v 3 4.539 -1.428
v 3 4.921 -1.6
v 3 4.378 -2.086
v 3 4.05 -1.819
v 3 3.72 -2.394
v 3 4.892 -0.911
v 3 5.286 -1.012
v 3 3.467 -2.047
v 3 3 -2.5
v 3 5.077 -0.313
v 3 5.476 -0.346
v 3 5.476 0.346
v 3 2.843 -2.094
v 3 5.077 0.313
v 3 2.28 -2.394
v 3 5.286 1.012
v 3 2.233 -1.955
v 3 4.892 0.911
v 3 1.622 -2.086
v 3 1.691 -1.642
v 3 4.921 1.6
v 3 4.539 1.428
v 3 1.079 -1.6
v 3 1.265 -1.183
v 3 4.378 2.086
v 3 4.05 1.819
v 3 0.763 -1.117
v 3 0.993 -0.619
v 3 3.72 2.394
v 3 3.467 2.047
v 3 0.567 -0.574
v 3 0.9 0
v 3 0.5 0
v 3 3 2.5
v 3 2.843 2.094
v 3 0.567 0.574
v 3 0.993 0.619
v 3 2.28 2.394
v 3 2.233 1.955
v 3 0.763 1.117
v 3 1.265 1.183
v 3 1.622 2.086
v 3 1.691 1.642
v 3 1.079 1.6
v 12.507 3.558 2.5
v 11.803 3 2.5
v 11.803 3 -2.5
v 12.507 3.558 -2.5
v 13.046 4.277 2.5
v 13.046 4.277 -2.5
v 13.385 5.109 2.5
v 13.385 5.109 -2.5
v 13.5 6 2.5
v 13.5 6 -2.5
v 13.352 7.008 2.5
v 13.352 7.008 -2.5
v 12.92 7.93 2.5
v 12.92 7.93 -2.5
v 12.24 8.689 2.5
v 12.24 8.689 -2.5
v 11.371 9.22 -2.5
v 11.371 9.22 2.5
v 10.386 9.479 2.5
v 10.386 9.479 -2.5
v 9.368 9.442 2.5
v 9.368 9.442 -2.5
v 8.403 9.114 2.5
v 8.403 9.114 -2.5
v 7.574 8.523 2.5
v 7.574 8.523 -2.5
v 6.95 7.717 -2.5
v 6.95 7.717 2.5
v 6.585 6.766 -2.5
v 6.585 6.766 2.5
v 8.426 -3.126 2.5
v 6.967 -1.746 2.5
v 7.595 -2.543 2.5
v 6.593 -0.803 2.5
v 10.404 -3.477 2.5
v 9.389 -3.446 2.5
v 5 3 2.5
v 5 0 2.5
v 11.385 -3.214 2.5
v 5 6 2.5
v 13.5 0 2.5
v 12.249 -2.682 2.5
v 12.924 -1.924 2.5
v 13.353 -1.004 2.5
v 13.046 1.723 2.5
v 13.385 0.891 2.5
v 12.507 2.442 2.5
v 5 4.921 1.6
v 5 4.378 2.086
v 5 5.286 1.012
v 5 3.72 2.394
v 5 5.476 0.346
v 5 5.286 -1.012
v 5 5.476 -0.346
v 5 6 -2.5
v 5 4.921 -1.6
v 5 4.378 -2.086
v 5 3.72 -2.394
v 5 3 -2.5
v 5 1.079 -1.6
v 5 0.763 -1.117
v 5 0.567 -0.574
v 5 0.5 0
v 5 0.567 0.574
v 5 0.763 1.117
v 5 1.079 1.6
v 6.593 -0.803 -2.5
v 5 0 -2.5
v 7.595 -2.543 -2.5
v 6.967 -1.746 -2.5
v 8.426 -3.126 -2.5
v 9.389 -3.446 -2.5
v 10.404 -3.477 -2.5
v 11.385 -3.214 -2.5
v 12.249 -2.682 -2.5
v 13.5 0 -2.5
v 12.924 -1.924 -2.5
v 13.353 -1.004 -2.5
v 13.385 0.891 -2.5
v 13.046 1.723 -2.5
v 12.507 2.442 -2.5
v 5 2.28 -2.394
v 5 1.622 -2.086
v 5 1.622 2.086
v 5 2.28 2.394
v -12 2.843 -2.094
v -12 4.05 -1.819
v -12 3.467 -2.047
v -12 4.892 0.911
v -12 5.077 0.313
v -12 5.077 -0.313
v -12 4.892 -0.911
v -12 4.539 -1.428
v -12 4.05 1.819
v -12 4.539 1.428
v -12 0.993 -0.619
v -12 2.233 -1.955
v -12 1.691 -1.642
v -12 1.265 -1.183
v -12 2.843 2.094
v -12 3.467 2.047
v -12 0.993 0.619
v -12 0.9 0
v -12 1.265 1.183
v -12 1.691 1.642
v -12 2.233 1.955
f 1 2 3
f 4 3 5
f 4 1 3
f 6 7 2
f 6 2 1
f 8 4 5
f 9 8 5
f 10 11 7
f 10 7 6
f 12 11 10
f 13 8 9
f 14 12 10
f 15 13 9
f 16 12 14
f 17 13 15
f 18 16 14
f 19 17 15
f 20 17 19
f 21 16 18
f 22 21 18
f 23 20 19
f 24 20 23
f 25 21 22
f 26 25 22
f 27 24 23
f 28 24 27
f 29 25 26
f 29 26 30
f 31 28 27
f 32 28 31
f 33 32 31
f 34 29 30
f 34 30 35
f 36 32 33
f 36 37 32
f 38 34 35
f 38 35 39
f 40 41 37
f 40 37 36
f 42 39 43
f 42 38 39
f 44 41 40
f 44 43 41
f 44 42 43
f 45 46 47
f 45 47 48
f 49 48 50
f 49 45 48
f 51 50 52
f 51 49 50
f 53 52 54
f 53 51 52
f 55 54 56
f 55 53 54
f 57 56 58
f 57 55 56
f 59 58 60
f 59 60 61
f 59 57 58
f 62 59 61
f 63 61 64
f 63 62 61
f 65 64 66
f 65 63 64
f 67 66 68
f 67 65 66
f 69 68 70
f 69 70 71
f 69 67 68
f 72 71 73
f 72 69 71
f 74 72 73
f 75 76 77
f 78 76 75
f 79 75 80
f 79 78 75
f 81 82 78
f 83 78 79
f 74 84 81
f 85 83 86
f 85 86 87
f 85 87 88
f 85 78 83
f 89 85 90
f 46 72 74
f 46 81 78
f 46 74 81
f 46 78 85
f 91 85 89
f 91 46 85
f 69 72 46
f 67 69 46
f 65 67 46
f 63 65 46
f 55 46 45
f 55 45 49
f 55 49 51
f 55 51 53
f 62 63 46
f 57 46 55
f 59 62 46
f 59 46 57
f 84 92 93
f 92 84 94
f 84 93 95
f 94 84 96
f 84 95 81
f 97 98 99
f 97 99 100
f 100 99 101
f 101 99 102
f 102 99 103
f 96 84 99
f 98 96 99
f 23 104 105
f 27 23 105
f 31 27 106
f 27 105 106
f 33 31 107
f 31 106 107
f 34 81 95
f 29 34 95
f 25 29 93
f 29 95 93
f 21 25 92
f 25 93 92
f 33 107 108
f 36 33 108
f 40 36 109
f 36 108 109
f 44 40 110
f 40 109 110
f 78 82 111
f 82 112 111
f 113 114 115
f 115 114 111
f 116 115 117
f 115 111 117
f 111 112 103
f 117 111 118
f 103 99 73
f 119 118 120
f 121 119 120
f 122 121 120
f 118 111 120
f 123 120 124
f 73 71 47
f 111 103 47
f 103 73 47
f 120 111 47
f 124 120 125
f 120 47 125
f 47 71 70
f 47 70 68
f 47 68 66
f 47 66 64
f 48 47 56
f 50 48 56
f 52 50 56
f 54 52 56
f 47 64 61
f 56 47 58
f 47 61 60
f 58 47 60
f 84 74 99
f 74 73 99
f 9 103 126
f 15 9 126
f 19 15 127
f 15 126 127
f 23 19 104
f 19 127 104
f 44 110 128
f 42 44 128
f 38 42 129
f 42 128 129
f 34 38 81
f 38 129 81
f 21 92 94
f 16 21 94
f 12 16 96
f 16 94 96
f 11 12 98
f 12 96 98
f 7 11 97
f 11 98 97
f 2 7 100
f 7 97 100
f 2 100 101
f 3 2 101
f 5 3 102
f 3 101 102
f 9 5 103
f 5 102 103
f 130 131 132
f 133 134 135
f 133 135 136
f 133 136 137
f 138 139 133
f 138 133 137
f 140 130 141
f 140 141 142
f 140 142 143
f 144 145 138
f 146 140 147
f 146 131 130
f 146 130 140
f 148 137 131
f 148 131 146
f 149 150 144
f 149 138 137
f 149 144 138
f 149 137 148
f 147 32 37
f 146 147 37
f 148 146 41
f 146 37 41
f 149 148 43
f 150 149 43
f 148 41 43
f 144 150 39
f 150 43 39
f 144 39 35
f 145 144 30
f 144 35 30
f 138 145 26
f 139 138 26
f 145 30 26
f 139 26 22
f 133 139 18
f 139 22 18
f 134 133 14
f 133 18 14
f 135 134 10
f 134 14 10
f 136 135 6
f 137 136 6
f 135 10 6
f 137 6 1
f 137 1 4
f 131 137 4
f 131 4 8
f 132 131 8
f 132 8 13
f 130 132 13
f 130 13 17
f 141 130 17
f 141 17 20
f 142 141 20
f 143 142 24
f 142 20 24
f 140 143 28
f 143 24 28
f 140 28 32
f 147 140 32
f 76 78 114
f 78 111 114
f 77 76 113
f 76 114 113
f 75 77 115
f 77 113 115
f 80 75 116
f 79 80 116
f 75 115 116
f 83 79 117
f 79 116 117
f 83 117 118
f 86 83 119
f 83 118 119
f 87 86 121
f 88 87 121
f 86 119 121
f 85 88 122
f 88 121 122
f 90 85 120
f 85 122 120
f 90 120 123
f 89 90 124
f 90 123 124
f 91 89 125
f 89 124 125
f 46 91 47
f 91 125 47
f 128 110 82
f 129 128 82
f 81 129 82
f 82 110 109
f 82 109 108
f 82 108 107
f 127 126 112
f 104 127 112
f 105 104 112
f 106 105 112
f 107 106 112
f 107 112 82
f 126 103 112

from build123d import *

# Parameters (mm, degrees)
F1_DEPTH = 2.5
F3_DEPTH = 2
F4_R     = 2.1
F5_DEPTH = 15


with BuildPart() as f1:
    # F0 (on Top) → F1 (new body, symmetric)
    with BuildSketch(Plane.XY):
        with BuildLine():
            ThreePointArc((8.1972243623, 3), (10, 2.5), (11.8027756377, 3))
            ThreePointArc((11.8027756377, 3), (10, 3.5), (8.1972243623, 3))
        make_face()
        with BuildLine():
            ThreePointArc((8.1972243623, 3), (6.7824000154, 4.6226654949), (6.584950352, 6.7664436716))
            Line((6.584950352, 6.7664436716), (5, 6))
            Line((5, 6), (5, 3))
            Line((5, 3), (5, 0))
            Line((5, 0), (6.5932639339, -0.8025891701))
            ThreePointArc((6.5932639339, -0.8025891701), (6.7751474224, 1.3602668315), (8.1972243623, 3))
        make_face()
        with BuildLine():
            ThreePointArc((11.8027756377, 3), (13.0462858313, 4.2765898242), (13.5, 6))
            ThreePointArc((13.5, 6), (10.385568562, 9.4786975844), (6.584950352, 6.7664436716))
            ThreePointArc((6.584950352, 6.7664436716), (6.7824000154, 4.6226654949), (8.1972243623, 3))
            ThreePointArc((8.1972243623, 3), (10, 3.5), (11.8027756377, 3))
        make_face()
        with BuildLine():
            ThreePointArc((13.5, 0), (13.0462858313, 1.7234101758), (11.8027756377, 3))
            ThreePointArc((11.8027756377, 3), (10, 2.5), (8.1972243623, 3))
            ThreePointArc((8.1972243623, 3), (6.7751474224, 1.3602668315), (6.5932639339, -0.8025891701))
            ThreePointArc((6.5932639339, -0.8025891701), (10.4039949063, -3.4766058327), (13.5, 0))
        make_face()
    extrude(amount=F1_DEPTH, both=True)

    # F2 (on face) → F3 (join)
    with BuildSketch(Plane(origin=(5, 0, 0), x_dir=(0, -1, 0), z_dir=(-1, 0, 0))):
        with BuildLine():
            ThreePointArc((-0.5, 0), (-0.6493210558, 0.8510631594), (-1.079446801, 1.6004609992))
            Line((-1.079446801, 1.6004609992), (-3, 0))
            Line((-3, 0), (-1.079446801, -1.6004609992))
            ThreePointArc((-1.079446801, -1.6004609992), (-0.6493210558, -0.8510631594), (-0.5, 0))
        make_face()
        with BuildLine():
            Line((-3, 0), (-1.079446801, 1.6004609992))
            ThreePointArc((-1.079446801, 1.6004609992), (-1.9396115094, 2.2639735531), (-3, 2.5))
            ThreePointArc((-3, 2.5), (-4.0603884906, 2.2639735531), (-4.920553199, 1.6004609992))
            Line((-4.920553199, 1.6004609992), (-3, 0))
        make_face()
        with BuildLine():
            Line((-1.079446801, -1.6004609992), (-3, 0))
            Line((-3, 0), (-4.920553199, -1.6004609992))
            ThreePointArc((-4.920553199, -1.6004609992), (-4.0603884906, -2.2639735531), (-3, -2.5))
            ThreePointArc((-3, -2.5), (-1.9396115094, -2.2639735531), (-1.079446801, -1.6004609992))
        make_face()
        with BuildLine():
            Line((-4.920553199, -1.6004609992), (-3, 0))
            Line((-3, 0), (-4.920553199, 1.6004609992))
            ThreePointArc((-4.920553199, 1.6004609992), (-5.5, 0), (-4.920553199, -1.6004609992))
        make_face()
    extrude(amount=F3_DEPTH)

    # F4 (on face) → F5 (join)
    with BuildSketch(Plane(origin=(3, 0, 0), x_dir=(0, -1, 0), z_dir=(-1, 0, 0))):
        with Locations((-3, 0)):
            Circle(F4_R)
    extrude(amount=F5_DEPTH)


solid = f1.part
